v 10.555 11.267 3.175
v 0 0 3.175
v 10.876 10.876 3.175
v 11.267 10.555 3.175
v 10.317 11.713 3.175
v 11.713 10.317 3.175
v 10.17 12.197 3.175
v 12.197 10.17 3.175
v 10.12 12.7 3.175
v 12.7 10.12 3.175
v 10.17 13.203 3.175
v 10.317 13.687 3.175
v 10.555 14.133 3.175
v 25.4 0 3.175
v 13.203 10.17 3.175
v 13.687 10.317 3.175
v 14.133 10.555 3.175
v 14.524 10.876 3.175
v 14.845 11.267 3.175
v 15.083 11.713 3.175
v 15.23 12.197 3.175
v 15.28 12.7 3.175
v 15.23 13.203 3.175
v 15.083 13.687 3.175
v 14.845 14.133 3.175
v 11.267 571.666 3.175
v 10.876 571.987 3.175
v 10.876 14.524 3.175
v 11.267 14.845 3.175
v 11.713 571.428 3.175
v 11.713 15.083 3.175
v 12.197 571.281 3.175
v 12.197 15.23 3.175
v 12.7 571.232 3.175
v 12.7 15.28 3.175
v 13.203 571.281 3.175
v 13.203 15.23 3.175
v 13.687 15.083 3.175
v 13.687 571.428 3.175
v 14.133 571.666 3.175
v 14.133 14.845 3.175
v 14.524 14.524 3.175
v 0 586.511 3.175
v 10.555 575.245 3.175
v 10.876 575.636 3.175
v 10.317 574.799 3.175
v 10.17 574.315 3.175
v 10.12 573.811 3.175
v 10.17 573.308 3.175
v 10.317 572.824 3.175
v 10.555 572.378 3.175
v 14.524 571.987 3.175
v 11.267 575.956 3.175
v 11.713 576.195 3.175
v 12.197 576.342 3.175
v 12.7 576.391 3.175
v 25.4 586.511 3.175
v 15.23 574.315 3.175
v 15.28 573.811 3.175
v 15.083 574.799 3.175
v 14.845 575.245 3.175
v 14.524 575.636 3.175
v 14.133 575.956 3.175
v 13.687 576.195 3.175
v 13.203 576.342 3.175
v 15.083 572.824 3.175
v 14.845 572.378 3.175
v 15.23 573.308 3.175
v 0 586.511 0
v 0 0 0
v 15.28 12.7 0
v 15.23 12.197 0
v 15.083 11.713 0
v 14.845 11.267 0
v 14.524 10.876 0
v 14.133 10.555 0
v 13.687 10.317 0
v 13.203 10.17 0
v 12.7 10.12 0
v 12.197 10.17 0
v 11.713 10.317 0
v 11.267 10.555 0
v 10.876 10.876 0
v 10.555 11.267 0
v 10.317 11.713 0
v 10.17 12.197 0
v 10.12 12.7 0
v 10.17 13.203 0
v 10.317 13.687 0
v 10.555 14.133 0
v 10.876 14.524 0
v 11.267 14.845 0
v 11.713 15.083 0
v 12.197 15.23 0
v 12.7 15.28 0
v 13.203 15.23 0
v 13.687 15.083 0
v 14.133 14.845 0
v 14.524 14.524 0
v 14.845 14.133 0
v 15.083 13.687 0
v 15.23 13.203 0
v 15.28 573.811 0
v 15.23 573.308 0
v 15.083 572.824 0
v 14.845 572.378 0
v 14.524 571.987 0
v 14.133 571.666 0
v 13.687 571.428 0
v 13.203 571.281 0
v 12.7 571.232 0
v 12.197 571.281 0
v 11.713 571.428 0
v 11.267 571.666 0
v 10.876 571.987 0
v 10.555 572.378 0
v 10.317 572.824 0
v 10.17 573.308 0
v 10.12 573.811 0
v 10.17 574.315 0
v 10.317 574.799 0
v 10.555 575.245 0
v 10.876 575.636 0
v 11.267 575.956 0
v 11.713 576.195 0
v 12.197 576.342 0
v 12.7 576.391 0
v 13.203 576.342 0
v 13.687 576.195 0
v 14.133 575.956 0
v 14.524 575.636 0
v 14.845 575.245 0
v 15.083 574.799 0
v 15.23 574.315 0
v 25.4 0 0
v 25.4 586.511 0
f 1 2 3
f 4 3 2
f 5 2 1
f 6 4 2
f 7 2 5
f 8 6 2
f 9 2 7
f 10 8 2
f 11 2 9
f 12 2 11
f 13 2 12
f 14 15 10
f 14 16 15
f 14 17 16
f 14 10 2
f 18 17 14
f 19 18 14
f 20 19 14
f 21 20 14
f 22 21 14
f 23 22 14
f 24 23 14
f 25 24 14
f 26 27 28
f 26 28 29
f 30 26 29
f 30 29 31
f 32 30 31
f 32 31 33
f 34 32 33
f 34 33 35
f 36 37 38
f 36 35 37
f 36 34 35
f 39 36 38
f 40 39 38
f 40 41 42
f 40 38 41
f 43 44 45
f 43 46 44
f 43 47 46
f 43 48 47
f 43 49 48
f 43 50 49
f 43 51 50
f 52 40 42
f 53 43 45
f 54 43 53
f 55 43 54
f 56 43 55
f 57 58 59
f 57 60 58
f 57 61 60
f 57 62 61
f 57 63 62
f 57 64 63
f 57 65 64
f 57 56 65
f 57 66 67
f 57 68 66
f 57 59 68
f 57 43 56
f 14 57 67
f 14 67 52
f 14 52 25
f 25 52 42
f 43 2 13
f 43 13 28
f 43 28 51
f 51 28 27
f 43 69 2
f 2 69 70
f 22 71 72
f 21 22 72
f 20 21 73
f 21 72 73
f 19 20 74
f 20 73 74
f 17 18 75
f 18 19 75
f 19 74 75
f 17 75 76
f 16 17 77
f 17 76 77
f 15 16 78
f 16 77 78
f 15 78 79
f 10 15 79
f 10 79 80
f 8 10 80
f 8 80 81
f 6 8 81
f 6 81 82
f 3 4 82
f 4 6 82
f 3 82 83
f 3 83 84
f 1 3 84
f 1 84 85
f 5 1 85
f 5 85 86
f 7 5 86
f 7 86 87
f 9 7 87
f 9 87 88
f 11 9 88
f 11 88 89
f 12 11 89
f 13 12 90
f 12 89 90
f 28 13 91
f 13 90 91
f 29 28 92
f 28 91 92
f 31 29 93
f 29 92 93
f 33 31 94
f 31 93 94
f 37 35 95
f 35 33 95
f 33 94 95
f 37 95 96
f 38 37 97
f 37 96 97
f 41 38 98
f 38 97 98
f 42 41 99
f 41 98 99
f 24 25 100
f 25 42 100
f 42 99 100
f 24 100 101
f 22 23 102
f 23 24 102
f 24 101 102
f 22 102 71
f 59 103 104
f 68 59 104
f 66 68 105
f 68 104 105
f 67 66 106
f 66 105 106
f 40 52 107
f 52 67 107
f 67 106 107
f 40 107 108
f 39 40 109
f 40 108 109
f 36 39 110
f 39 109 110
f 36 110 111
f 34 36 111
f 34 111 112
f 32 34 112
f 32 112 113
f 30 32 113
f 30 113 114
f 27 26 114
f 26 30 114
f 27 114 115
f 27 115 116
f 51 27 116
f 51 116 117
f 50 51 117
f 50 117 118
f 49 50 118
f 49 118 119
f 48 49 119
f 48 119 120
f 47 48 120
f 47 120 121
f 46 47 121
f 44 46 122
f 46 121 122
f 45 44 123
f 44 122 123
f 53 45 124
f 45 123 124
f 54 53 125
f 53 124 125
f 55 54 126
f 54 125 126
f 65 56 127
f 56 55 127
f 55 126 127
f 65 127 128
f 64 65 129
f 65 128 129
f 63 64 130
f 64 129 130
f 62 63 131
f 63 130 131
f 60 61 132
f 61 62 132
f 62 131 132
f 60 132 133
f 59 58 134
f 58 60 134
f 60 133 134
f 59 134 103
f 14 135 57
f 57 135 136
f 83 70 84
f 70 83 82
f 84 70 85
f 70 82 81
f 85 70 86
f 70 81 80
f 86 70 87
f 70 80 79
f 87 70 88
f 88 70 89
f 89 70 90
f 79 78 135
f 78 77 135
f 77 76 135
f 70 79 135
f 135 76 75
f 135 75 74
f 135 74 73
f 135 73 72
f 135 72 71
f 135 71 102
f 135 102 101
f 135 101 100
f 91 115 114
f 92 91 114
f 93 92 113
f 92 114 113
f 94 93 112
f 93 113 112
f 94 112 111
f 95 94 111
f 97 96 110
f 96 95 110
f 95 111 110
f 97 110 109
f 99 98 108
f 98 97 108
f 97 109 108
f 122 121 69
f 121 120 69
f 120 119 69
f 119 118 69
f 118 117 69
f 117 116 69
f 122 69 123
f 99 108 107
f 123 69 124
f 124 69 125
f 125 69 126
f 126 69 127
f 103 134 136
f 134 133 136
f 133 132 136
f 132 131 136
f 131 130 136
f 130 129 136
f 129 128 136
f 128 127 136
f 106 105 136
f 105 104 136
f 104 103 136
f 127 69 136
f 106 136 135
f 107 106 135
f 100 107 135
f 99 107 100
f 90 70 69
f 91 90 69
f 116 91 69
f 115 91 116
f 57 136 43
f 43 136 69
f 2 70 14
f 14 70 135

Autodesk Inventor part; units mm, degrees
ref_plane "YZ Plane" through (0, 0, 0) normal (1, 0, 0) x (0, 1, 0)
ref_plane "XZ Plane" through (0, 0, 0) normal (0, 1, 0) x (-1, 0, 0)
ref_plane "XY Plane" through (0, 0, 0) normal (0, 0, 1) x (1, 0, 0)
sketch "Sketch1" plane through (0, 0, 0) normal (0, 0, 1) x (1, 0, 0)
  line L0 (0, 0) -> (25.4, 0)
  line L1 (25.4, 0) -> (25.4, 586.5114)
  line L2 (25.4, 586.5114) -> (0, 586.5114)
  line L3 (0, 586.5114) -> (0, 0)
  line L4 (12.7, 0) -> (12.7, 12.7) construction
  circle A0 centre (12.7, 12.7) radius 2.5797
  line L5 (12.7, 586.5114) -> (12.7, 573.8114) construction
  circle A1 centre (12.7, 573.8114) radius 2.5797
  dimension "d0" = 25.4
  dimension "d2" = 12.7
  dimension "d3" = 5.1594
  dimension "d4" = 12.7
  dimension "d7" = 561.1114
extrude "Extrusion1" add sketch "Sketch1" along normal blind 3.175
properties part number "Strutural Integrity Bar"
